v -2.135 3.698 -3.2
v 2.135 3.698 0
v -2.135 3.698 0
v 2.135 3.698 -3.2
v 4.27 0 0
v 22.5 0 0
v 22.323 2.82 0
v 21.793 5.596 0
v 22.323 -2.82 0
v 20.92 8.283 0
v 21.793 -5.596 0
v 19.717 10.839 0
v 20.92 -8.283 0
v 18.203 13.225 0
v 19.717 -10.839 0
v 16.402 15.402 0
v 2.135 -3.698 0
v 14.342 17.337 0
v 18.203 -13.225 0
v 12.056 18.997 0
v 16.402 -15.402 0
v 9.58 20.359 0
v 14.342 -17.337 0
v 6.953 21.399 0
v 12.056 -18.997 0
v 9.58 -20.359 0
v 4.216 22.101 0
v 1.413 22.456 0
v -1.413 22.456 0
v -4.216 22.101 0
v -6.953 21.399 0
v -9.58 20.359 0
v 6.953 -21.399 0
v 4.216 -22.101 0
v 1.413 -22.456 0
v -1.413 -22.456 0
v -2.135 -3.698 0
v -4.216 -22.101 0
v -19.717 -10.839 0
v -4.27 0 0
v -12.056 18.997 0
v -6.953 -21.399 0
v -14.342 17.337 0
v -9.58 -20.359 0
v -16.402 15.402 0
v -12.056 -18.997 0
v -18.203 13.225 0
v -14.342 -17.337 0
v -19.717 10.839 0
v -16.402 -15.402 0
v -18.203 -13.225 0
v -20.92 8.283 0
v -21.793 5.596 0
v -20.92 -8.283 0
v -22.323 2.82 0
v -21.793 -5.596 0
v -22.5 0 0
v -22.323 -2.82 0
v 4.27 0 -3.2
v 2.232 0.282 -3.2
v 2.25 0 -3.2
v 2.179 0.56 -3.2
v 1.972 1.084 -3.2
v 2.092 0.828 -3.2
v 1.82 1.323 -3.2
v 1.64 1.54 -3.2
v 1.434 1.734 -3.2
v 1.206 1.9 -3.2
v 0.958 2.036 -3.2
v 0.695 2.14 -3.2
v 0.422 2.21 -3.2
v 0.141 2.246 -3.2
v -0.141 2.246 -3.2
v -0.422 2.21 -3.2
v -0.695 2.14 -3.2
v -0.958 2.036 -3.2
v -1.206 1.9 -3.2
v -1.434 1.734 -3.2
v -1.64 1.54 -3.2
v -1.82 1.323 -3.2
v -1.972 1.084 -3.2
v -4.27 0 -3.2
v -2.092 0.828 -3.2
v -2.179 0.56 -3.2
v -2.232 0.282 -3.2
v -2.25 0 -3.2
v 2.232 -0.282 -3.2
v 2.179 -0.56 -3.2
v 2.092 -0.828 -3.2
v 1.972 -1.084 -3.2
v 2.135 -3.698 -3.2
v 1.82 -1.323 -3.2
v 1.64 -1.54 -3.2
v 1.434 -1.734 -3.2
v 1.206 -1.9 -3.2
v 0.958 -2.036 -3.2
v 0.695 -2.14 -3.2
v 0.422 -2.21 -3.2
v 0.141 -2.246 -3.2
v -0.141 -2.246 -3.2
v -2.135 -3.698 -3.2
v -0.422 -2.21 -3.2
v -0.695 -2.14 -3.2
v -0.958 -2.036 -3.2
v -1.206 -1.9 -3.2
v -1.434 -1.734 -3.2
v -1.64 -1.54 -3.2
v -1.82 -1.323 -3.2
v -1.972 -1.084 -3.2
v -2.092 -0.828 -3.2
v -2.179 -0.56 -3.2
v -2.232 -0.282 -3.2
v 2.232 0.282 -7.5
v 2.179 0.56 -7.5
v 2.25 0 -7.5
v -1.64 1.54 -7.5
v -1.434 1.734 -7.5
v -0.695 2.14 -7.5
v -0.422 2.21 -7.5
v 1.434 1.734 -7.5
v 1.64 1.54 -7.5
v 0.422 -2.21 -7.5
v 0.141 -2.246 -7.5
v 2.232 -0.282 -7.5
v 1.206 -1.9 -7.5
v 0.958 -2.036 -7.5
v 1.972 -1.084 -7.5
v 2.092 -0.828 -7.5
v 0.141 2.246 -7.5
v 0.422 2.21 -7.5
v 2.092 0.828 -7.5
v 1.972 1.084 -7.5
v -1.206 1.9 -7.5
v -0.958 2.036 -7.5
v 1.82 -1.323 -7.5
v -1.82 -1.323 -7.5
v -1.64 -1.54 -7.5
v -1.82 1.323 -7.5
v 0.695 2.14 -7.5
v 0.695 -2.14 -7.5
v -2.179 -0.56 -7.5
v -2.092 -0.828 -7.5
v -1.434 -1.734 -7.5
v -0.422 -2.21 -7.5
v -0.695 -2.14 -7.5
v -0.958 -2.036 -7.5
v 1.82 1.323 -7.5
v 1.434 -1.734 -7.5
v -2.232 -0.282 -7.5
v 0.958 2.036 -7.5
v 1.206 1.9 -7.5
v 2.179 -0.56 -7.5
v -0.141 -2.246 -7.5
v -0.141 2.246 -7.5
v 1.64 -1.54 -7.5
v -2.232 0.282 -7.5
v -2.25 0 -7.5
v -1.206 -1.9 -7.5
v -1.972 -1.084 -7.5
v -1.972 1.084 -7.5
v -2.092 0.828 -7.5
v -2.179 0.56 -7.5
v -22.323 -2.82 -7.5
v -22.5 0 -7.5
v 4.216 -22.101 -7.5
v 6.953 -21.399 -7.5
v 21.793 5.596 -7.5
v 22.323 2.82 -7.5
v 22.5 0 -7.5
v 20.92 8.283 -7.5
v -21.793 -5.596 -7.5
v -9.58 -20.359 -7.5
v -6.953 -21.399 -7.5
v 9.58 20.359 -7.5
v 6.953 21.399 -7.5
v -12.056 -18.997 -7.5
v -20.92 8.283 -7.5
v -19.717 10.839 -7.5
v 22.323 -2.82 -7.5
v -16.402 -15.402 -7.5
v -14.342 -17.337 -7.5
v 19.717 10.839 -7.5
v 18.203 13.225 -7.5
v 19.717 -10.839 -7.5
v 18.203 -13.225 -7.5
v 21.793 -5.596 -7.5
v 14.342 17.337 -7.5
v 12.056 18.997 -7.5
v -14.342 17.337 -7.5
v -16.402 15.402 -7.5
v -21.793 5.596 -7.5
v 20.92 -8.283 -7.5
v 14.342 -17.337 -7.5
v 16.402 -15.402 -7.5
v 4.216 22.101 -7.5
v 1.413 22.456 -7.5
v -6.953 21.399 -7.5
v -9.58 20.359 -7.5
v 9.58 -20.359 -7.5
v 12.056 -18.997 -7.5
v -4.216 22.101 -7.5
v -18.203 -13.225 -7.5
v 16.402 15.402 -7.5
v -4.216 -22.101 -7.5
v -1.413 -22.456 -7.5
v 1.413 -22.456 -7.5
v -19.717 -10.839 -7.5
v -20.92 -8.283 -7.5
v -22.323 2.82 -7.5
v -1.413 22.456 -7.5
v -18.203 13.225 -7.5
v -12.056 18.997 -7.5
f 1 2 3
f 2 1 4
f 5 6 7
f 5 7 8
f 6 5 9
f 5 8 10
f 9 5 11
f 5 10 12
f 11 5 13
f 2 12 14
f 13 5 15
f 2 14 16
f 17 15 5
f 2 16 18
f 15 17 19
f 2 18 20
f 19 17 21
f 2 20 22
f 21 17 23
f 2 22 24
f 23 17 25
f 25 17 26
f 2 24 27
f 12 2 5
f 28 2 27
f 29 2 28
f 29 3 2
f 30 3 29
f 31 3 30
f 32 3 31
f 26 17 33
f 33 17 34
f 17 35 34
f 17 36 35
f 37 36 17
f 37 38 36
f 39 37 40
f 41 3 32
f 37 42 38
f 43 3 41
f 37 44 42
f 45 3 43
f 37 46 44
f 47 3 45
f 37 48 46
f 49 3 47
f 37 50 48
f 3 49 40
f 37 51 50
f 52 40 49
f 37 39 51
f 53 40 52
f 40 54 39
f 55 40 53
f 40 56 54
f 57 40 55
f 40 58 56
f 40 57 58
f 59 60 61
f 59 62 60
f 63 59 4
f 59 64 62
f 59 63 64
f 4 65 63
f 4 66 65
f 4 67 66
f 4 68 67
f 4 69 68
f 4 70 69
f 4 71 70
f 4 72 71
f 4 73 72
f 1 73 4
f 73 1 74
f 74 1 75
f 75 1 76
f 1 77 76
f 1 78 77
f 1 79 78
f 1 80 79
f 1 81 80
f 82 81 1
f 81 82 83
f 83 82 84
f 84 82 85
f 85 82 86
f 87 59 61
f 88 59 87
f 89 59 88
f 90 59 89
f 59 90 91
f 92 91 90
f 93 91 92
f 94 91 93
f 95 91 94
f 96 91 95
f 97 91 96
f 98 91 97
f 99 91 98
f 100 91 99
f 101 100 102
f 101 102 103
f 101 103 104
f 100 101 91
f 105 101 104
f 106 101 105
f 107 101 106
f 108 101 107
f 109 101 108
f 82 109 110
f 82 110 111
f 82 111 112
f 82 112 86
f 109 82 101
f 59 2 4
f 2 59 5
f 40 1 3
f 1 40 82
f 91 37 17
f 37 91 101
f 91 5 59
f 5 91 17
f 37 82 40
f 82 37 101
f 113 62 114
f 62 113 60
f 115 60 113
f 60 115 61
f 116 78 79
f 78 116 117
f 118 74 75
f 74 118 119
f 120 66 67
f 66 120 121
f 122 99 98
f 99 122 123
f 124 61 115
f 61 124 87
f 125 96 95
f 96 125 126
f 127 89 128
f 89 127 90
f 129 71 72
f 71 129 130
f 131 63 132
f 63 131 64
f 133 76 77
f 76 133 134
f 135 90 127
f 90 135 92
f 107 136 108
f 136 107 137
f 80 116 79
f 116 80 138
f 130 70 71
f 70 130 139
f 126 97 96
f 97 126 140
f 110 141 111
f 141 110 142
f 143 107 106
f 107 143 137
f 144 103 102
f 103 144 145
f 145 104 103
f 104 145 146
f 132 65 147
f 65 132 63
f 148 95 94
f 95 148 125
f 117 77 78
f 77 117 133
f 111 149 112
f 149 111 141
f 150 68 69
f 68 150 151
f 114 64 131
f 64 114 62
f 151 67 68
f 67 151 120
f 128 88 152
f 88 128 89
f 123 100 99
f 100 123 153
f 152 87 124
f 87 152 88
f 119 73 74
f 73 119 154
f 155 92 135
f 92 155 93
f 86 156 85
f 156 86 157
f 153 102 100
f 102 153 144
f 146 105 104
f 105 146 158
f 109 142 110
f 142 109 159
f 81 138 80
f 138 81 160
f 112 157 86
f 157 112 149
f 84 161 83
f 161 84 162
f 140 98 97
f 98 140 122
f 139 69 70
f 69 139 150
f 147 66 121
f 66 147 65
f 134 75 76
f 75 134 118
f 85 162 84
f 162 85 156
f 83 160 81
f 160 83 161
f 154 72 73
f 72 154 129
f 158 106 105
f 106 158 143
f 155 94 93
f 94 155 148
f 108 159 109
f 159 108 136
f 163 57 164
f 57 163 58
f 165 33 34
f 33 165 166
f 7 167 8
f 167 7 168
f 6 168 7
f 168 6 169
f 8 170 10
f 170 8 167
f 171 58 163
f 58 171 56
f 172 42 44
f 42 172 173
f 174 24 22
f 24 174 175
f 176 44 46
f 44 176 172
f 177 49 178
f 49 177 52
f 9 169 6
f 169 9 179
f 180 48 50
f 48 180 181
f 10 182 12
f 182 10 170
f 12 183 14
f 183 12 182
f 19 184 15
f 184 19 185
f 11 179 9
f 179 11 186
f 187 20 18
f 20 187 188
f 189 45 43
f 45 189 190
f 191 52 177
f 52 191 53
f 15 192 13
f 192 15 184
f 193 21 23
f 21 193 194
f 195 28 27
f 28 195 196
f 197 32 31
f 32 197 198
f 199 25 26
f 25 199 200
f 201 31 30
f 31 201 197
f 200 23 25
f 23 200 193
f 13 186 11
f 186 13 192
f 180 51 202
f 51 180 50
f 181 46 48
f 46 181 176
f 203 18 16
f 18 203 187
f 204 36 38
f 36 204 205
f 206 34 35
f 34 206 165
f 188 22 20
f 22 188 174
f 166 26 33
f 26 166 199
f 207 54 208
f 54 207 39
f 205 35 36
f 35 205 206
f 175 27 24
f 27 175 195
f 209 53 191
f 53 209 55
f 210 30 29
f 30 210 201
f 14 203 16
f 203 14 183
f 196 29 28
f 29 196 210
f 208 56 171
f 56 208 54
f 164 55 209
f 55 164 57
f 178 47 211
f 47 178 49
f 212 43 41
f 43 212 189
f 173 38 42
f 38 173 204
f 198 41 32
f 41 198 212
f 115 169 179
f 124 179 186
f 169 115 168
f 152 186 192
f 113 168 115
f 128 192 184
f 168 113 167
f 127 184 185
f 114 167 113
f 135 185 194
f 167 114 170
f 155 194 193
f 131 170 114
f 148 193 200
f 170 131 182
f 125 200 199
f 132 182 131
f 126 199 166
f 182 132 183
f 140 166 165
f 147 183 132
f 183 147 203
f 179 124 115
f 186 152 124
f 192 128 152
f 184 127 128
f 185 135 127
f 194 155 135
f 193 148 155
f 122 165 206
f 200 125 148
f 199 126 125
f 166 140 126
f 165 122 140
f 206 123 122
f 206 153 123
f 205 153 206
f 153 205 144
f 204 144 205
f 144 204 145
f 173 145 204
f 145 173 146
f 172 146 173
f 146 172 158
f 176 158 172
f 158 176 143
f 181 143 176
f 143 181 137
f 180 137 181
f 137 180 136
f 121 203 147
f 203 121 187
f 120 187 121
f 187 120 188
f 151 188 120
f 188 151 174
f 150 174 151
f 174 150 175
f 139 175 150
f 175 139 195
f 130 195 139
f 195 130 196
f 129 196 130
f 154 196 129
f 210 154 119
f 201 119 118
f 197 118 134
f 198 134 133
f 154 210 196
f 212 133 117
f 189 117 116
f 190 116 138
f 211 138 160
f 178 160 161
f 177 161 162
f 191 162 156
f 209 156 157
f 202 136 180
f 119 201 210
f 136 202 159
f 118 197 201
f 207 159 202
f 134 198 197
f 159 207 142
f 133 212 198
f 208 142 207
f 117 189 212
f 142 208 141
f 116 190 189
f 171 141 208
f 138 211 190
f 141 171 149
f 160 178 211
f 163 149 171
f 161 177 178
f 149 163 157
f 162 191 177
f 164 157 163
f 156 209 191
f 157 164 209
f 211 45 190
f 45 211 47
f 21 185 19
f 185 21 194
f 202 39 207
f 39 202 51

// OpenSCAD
$fn = 50;


difference() {
	union() {
		translate(v = [0, 0, -7.5000000000]) {
			cylinder(h = 7.5000000000, r = 22.5000000000);
		}
	}
	union() {
		translate(v = [0, 0, 0]) {
			rotate(a = [0, 0, 0]) {
				difference() {
					union() {
						translate(v = [0, 0, -3.2000000000]) {
							linear_extrude(height = 3.2000000000) {
								polygon(points = [[4.2698000000, 0.0000000000], [2.1349000000, 3.6977552691], [-2.1349000000, 3.6977552691], [-4.2698000000, 0.0000000000], [-2.1349000000, -3.6977552691], [2.1349000000, -3.6977552691]]);
							}
						}
					}
					union();
				}
			}
		}
		#translate(v = [0, 0, -100.0000000000]) {
			cylinder(h = 200, r = 2.2500000000);
		}
	}
}
